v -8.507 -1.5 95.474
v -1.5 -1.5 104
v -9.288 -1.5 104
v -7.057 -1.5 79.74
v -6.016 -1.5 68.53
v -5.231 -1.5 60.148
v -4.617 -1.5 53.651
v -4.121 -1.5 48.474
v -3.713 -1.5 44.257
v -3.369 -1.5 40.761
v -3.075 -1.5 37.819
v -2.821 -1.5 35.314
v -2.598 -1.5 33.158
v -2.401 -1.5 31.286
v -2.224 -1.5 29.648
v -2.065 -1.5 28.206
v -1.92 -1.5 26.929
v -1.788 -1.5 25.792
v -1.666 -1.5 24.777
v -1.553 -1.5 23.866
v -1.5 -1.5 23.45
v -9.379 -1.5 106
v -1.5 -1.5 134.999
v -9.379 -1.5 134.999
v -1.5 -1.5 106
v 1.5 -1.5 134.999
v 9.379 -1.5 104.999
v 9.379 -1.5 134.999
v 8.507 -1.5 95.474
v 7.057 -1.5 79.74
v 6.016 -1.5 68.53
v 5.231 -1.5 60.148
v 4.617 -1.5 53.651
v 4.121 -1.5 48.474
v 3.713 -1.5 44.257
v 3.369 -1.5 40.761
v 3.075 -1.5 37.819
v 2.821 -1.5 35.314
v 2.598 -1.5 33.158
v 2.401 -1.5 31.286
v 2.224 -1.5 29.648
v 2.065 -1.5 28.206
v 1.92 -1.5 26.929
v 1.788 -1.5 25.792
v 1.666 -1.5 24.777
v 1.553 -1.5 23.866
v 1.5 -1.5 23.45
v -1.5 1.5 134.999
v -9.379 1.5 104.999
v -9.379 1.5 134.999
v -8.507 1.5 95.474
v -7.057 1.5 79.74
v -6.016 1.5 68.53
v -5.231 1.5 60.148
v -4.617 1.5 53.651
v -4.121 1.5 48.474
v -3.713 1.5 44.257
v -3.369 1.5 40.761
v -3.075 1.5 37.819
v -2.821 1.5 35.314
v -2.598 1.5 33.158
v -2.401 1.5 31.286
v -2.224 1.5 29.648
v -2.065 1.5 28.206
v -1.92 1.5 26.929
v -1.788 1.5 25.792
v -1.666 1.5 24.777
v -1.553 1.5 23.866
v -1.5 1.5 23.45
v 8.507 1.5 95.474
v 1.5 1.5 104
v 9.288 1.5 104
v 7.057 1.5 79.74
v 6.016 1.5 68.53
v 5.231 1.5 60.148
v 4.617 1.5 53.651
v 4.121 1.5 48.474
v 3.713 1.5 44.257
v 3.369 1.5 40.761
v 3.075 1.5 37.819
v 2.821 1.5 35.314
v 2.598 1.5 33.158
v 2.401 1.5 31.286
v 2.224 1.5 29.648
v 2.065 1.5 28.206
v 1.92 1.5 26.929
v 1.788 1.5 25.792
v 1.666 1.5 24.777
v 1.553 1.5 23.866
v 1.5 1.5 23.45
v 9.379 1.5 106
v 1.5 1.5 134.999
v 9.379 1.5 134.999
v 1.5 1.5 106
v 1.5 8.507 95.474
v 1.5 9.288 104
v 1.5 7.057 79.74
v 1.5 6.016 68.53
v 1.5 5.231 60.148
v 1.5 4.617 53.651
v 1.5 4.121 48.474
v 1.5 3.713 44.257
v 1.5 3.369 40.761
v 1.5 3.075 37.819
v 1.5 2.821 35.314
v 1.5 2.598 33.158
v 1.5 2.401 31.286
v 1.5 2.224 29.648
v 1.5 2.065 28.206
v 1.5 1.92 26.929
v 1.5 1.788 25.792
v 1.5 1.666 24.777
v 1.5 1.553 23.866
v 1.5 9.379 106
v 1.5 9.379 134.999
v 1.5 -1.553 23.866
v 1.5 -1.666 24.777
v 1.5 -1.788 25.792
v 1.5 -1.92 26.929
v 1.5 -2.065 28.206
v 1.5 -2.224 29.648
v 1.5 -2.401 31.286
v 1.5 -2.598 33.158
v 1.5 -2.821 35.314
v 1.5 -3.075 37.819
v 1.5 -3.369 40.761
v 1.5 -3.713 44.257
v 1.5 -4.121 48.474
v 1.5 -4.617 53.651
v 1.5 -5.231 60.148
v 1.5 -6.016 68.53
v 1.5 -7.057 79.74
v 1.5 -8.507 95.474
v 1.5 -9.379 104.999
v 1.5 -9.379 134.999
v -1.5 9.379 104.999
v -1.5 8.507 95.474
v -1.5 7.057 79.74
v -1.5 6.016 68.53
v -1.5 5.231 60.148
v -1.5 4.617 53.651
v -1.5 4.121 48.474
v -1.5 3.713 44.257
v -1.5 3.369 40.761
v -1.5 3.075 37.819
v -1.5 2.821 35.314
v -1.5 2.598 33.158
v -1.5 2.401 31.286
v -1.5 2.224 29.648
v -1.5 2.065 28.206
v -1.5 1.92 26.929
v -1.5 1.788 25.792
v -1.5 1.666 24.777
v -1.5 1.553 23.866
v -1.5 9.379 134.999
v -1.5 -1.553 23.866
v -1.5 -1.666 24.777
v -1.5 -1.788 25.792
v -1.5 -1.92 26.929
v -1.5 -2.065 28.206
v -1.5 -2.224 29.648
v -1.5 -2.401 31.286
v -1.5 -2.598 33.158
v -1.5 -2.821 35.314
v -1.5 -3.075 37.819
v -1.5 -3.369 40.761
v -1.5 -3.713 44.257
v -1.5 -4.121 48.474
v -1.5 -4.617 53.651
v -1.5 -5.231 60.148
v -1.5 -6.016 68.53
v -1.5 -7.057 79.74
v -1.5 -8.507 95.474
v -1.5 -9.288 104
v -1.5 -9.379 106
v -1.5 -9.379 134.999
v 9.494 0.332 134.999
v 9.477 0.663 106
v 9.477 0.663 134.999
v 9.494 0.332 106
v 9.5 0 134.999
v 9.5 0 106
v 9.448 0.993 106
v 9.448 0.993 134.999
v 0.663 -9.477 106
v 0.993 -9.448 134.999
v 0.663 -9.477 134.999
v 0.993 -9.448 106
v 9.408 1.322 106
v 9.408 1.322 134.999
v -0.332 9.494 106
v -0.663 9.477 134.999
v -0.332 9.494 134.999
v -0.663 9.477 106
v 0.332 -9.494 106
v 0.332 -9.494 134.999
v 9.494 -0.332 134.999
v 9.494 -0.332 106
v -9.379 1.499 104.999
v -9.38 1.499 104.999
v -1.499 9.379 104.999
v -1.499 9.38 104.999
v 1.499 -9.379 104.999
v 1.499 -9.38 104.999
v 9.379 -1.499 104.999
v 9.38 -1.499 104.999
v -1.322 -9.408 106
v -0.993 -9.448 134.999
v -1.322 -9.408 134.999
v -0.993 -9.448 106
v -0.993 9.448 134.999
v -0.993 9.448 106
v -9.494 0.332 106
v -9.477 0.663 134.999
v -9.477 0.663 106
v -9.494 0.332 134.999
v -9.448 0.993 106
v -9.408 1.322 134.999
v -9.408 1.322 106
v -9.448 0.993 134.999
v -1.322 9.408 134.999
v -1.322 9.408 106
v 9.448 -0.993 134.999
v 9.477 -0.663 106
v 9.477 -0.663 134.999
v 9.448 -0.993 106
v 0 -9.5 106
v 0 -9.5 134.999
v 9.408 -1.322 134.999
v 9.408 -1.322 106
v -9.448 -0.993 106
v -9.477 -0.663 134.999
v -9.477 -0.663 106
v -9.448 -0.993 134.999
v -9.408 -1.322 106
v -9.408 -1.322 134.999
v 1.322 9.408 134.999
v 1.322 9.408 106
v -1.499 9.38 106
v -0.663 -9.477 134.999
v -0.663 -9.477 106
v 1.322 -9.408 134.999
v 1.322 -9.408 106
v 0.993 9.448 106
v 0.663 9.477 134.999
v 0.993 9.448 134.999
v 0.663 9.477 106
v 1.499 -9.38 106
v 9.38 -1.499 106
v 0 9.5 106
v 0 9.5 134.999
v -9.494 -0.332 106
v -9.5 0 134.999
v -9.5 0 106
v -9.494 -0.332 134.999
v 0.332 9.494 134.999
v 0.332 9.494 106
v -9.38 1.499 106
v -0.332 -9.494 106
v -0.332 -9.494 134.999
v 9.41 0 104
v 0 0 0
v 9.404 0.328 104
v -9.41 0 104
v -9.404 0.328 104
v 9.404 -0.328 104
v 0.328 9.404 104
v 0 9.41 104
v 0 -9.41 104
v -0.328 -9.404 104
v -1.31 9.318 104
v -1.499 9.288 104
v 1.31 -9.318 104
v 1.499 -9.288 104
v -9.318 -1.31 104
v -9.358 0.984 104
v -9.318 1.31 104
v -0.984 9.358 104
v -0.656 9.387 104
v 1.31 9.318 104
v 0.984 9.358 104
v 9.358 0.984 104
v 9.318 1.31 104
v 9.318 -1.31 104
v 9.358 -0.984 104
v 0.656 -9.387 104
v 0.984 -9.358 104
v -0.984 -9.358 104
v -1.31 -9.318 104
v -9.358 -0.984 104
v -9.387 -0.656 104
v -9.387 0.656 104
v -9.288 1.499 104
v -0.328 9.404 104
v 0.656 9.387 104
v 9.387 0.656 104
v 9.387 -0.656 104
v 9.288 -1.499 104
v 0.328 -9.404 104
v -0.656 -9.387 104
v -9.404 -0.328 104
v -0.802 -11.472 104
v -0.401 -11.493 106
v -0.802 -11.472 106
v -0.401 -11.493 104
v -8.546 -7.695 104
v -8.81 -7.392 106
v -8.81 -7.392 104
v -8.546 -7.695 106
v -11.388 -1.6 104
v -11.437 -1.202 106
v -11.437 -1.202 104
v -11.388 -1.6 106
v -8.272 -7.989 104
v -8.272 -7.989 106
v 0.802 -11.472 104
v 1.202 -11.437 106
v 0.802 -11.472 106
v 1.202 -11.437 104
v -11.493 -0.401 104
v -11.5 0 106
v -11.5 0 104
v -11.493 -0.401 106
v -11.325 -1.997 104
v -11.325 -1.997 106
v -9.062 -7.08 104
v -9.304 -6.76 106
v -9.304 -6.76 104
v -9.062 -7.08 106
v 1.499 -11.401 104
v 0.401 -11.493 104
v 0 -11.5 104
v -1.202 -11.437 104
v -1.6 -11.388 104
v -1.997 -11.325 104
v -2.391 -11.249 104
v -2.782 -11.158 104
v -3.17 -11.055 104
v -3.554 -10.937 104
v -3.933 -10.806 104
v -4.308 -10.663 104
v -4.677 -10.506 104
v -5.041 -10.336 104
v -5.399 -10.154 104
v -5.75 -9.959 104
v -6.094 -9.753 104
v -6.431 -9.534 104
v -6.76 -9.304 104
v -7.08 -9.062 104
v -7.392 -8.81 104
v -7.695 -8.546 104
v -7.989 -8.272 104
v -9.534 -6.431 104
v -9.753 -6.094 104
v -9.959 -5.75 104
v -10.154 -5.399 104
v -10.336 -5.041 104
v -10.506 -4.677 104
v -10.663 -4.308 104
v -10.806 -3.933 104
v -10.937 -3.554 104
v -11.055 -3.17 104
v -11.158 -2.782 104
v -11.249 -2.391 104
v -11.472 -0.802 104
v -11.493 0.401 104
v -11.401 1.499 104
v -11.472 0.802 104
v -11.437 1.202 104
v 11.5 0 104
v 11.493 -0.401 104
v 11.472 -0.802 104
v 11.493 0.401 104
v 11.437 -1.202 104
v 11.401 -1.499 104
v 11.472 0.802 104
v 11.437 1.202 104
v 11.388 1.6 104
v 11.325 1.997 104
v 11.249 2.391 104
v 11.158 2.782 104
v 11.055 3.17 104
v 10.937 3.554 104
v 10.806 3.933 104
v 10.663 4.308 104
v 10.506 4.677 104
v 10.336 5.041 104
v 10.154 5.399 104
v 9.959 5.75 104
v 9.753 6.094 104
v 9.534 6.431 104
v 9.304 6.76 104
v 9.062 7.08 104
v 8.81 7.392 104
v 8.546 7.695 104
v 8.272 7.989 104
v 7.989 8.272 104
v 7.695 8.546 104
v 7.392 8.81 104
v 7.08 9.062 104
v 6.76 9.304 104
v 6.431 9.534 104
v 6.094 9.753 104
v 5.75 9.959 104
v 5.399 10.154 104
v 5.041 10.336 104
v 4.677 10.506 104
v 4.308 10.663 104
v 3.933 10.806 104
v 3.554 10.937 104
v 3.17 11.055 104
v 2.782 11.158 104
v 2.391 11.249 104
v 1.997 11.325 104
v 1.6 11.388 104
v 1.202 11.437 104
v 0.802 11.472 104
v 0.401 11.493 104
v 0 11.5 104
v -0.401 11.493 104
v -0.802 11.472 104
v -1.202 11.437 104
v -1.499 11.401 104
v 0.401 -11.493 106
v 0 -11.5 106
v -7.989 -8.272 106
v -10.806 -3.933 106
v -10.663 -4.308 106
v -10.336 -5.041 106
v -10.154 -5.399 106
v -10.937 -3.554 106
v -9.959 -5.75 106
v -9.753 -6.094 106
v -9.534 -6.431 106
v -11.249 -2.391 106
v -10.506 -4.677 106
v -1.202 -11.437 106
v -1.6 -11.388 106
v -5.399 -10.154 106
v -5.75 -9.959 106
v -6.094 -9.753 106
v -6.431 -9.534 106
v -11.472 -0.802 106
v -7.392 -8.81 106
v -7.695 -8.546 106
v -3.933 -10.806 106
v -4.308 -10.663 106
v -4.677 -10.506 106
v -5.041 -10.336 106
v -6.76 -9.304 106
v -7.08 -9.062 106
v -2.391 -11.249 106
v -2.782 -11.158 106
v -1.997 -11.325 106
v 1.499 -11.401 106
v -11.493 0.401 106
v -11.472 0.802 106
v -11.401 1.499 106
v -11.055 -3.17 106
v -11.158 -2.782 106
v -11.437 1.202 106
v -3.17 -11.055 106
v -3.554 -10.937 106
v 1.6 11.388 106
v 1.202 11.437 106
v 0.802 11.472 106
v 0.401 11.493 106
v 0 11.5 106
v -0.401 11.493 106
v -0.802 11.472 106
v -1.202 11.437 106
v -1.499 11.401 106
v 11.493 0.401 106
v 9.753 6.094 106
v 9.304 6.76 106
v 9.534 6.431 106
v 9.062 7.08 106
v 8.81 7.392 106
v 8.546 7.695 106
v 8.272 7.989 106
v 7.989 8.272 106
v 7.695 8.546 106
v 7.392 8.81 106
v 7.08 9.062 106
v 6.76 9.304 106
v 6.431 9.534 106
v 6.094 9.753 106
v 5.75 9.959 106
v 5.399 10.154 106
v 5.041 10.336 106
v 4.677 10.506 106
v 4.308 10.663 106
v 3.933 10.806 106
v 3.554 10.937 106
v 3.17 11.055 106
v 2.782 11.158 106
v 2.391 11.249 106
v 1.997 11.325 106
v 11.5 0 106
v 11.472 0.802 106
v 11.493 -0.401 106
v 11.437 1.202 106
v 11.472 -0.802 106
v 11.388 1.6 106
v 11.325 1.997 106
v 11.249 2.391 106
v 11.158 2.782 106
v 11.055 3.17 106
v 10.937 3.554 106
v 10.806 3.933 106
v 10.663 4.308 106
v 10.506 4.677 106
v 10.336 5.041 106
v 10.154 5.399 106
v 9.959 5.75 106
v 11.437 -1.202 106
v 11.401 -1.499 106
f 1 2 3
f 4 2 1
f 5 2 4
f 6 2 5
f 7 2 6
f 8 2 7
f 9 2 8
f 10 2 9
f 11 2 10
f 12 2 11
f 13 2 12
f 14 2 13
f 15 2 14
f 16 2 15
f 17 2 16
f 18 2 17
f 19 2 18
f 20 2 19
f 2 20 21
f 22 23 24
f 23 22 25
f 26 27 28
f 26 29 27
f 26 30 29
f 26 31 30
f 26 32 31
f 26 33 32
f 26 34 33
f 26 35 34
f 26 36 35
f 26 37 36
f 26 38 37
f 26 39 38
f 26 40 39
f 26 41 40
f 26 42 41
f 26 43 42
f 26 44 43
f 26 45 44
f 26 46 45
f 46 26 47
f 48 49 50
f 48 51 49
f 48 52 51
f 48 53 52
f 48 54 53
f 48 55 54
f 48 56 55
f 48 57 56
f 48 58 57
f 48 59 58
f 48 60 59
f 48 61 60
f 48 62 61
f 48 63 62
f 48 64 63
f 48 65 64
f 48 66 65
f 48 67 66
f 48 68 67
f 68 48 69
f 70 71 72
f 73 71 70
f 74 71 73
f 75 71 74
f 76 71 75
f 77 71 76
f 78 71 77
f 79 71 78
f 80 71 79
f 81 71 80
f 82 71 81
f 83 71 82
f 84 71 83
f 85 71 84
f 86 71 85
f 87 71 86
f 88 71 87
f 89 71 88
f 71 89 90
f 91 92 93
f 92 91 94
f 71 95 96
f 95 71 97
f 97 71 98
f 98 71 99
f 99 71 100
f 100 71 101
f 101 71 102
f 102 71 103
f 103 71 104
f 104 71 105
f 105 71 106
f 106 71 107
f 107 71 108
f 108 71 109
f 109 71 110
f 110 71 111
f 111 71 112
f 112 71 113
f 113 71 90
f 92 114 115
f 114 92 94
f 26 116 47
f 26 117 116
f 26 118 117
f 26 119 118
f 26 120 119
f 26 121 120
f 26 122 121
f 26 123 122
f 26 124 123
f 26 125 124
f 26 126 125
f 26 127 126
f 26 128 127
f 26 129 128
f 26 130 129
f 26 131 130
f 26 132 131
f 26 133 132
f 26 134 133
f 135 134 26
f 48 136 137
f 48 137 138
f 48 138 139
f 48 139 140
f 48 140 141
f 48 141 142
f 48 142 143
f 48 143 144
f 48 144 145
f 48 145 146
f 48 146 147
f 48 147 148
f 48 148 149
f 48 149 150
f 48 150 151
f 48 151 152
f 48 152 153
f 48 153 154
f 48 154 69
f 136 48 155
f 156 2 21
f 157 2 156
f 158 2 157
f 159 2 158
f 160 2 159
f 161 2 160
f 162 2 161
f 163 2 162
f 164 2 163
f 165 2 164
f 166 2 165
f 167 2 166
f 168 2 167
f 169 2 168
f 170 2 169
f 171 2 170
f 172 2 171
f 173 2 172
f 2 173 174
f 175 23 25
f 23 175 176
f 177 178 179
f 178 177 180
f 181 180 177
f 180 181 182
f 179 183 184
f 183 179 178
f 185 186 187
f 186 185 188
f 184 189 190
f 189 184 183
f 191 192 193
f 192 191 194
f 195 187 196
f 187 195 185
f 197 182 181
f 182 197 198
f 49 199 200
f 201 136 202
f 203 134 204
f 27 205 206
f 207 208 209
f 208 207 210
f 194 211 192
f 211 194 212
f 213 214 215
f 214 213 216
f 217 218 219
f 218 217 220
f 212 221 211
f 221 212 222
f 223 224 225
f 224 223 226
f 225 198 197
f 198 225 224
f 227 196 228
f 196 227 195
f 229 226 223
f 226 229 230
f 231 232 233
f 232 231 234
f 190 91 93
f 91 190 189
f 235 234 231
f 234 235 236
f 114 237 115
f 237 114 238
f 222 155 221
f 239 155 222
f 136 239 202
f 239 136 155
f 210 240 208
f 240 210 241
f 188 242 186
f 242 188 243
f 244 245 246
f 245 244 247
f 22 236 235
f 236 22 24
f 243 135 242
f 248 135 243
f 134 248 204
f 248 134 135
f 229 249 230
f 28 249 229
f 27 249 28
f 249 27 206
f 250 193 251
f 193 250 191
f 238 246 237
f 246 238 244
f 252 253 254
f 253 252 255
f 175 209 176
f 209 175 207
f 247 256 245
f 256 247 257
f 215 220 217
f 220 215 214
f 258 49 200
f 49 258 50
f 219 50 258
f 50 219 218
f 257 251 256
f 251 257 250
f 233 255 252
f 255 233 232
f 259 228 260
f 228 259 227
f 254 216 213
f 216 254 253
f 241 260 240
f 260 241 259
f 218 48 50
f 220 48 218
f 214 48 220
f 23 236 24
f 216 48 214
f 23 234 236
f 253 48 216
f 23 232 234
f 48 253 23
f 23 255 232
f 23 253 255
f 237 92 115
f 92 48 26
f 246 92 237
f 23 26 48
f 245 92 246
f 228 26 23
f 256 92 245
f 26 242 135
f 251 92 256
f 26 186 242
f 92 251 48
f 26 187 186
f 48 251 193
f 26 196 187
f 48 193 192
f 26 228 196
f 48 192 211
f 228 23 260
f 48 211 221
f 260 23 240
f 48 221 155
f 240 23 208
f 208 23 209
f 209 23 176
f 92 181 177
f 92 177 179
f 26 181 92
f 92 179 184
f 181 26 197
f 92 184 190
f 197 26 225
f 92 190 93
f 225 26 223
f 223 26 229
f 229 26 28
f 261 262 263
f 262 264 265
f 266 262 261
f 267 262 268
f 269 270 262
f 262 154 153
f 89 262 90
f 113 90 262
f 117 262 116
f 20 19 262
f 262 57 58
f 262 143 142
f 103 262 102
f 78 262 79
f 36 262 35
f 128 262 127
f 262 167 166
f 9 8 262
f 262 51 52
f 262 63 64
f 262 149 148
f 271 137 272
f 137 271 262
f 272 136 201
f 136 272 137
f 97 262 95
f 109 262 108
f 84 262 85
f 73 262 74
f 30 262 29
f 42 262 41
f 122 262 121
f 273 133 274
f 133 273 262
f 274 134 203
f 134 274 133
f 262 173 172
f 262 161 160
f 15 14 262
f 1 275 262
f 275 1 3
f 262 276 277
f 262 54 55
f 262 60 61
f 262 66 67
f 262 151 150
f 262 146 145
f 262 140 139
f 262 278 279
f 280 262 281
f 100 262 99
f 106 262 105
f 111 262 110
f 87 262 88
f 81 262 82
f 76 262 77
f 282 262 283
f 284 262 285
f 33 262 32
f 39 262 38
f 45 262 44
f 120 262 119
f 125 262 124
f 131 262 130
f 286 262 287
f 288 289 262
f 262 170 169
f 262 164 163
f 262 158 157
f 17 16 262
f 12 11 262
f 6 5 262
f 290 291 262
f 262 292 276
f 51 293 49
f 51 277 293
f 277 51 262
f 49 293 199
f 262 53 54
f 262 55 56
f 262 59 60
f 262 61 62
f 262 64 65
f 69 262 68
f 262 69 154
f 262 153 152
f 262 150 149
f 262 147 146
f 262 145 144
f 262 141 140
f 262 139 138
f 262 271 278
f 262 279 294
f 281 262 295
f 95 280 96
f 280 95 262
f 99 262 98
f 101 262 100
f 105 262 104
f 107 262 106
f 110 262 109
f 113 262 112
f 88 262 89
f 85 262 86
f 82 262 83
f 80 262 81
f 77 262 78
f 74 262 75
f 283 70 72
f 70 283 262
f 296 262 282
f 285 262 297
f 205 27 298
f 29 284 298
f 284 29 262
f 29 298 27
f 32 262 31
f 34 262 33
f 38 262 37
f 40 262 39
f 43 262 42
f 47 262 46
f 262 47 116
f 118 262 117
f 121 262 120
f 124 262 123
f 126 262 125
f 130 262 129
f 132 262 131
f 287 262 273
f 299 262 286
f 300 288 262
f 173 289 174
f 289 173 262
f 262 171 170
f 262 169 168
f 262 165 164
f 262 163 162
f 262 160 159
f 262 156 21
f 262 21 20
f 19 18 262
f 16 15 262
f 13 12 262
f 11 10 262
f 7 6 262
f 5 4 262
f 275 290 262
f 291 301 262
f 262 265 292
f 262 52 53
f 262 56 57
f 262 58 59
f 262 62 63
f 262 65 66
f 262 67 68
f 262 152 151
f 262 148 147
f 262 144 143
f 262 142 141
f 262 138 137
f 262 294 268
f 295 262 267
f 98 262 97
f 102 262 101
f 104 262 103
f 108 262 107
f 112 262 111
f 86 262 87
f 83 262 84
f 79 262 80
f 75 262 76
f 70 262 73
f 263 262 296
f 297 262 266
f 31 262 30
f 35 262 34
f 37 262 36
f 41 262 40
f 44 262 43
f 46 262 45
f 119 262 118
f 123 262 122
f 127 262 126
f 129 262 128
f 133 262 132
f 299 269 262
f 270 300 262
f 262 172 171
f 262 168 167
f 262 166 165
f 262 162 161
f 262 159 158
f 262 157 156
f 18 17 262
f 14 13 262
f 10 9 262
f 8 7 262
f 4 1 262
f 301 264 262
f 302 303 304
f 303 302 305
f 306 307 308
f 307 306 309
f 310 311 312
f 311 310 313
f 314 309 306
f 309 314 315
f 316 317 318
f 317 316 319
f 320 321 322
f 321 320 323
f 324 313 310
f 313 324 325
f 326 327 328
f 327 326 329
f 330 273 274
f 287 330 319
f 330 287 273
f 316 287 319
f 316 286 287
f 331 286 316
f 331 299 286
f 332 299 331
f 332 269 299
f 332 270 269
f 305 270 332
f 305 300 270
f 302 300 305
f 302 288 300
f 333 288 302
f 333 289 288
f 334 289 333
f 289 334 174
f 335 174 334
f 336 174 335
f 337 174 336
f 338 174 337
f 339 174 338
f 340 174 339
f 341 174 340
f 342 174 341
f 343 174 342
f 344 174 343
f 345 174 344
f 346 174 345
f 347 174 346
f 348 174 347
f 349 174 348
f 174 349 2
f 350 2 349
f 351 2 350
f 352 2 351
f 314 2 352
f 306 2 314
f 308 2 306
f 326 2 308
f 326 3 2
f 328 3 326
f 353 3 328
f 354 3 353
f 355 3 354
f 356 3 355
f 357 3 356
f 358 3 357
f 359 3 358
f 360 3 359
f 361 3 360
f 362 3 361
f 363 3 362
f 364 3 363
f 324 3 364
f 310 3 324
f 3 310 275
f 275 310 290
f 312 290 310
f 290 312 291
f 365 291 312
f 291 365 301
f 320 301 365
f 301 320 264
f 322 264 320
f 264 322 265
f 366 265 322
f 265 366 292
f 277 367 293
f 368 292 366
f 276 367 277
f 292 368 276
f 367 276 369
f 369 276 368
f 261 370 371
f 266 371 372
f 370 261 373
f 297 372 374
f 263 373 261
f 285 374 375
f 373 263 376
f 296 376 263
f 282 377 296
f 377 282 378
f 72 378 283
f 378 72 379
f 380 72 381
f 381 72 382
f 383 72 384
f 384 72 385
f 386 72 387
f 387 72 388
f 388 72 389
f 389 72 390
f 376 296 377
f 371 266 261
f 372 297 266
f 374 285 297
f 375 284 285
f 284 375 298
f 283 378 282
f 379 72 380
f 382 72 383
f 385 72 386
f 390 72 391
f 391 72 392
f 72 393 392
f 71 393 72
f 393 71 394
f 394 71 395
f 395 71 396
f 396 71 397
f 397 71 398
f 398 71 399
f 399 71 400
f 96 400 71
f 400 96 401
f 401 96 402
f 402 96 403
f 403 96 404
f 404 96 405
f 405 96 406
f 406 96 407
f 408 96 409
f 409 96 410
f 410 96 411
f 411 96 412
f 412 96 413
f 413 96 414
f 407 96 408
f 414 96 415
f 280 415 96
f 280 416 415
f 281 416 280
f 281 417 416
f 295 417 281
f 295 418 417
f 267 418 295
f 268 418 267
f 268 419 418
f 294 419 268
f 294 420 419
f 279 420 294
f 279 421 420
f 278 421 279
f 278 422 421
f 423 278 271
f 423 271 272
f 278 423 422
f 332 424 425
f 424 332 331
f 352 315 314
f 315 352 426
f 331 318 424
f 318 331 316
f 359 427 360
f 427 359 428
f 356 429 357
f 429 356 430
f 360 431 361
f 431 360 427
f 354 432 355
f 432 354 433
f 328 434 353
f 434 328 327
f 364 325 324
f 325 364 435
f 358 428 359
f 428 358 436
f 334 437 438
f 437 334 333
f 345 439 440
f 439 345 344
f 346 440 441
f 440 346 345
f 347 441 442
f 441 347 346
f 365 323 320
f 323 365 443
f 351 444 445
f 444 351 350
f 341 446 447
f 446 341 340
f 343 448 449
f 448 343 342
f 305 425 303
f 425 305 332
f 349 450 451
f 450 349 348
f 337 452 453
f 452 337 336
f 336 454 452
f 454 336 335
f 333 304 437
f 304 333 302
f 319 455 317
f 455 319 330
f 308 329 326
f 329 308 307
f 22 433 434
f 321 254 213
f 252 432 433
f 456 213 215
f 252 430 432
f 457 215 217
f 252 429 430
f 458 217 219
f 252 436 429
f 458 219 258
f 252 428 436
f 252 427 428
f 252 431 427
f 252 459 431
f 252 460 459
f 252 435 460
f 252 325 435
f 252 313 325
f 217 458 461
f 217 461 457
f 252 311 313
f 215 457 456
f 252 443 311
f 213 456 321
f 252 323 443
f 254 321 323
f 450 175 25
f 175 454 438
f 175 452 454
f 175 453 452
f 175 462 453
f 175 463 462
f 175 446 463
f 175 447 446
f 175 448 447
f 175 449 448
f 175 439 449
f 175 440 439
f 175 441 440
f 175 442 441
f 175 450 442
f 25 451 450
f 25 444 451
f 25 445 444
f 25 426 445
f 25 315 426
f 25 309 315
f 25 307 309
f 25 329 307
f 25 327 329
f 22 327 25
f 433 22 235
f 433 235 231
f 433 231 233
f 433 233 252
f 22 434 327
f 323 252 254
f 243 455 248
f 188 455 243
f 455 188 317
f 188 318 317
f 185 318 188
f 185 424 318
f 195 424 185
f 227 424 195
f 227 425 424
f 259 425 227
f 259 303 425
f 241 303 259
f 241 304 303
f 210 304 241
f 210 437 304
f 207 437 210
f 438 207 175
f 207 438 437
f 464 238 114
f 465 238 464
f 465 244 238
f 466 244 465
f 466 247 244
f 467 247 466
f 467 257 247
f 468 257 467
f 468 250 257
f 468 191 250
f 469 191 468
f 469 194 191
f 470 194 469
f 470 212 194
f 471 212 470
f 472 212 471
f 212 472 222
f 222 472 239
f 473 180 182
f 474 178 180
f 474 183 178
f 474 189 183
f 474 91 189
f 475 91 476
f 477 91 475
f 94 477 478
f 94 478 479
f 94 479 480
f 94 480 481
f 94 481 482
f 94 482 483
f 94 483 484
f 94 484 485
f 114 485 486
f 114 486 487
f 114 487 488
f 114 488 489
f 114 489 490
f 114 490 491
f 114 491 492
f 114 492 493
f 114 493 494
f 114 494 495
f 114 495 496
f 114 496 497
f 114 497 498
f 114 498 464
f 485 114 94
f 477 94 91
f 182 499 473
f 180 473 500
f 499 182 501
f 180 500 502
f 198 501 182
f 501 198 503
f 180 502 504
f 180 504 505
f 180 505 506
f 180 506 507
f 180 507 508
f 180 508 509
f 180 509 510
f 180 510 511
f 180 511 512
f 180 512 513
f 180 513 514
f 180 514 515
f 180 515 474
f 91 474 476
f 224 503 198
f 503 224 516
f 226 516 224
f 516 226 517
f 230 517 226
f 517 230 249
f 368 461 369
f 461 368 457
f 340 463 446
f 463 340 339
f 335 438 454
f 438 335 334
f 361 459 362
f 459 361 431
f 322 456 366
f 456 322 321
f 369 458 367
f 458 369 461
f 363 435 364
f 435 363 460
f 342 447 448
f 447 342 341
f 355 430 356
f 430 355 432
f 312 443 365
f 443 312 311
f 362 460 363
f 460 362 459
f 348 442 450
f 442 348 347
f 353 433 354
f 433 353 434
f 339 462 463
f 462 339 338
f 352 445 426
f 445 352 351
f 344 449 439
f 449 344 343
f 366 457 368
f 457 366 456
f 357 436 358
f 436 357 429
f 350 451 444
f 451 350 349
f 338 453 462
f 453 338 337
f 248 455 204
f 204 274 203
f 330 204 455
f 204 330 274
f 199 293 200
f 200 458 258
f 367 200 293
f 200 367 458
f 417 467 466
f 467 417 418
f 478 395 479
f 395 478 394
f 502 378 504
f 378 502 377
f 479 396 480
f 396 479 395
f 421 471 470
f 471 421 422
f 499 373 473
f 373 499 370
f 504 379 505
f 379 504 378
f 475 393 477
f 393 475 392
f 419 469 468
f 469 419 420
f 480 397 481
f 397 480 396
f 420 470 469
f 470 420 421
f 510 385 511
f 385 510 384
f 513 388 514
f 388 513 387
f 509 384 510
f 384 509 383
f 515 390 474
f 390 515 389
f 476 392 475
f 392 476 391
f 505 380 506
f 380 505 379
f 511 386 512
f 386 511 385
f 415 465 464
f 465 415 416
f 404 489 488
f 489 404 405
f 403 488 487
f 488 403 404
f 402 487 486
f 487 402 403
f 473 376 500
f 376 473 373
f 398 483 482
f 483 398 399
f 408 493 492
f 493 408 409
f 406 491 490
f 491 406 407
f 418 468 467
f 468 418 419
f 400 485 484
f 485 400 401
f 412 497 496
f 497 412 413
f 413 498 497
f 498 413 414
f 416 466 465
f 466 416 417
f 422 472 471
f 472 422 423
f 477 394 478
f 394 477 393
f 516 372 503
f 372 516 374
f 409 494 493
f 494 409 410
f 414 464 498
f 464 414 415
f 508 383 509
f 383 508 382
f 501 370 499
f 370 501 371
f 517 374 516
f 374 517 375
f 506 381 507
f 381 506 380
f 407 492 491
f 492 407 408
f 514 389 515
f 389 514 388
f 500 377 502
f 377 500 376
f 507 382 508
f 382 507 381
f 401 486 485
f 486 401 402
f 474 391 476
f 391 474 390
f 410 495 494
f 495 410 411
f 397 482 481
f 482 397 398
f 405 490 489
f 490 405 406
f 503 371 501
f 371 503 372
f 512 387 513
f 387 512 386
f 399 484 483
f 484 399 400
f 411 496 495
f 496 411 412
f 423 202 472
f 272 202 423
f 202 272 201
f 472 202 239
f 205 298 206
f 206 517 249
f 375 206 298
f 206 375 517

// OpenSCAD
$fn = 180;
ff = 0.001;  // fudge

stake_l = 105;
wing_t = 3;
insert_l = 30;  // includes collar
insert_d = 19;
collar_d = insert_d + 4;
collar_h = 2;

full_l = stake_l + insert_l;

union() {

  // stake
  intersection() {
    // wings
    union() {
      translate([ 0, 0, full_l / 2 ]) {
        rotate(90, [ 0, 0, 1 ])
          cube([ wing_t, insert_d, full_l ], center = true);
        cube([ wing_t, insert_d, full_l ], center = true);
      }
    }

    // cone
    union() {
      translate([ 0, 0, stake_l - ff ])
        cylinder(h = insert_l, d = insert_d);
      cylinder(h = stake_l, d1 = 0, d2 = insert_d, center = false);
    }
  }

  // collar
  translate([ 0, 0, full_l - insert_l ]) {
    collar_wedge();

    rotate(180, [ 0, 0, 1 ])
      collar_wedge();
  }
}

module collar_wedge() {
  jj = (wing_t / 2) - ff;
  difference() {
    cylinder(h = collar_h, d = collar_d, center = true);
    translate([ jj, -collar_d, -collar_d ])
      cube(collar_d * 2, center = false);
    translate([ -collar_d, jj, -collar_d ])
      cube(collar_d * 2, center = false);
  }
}
